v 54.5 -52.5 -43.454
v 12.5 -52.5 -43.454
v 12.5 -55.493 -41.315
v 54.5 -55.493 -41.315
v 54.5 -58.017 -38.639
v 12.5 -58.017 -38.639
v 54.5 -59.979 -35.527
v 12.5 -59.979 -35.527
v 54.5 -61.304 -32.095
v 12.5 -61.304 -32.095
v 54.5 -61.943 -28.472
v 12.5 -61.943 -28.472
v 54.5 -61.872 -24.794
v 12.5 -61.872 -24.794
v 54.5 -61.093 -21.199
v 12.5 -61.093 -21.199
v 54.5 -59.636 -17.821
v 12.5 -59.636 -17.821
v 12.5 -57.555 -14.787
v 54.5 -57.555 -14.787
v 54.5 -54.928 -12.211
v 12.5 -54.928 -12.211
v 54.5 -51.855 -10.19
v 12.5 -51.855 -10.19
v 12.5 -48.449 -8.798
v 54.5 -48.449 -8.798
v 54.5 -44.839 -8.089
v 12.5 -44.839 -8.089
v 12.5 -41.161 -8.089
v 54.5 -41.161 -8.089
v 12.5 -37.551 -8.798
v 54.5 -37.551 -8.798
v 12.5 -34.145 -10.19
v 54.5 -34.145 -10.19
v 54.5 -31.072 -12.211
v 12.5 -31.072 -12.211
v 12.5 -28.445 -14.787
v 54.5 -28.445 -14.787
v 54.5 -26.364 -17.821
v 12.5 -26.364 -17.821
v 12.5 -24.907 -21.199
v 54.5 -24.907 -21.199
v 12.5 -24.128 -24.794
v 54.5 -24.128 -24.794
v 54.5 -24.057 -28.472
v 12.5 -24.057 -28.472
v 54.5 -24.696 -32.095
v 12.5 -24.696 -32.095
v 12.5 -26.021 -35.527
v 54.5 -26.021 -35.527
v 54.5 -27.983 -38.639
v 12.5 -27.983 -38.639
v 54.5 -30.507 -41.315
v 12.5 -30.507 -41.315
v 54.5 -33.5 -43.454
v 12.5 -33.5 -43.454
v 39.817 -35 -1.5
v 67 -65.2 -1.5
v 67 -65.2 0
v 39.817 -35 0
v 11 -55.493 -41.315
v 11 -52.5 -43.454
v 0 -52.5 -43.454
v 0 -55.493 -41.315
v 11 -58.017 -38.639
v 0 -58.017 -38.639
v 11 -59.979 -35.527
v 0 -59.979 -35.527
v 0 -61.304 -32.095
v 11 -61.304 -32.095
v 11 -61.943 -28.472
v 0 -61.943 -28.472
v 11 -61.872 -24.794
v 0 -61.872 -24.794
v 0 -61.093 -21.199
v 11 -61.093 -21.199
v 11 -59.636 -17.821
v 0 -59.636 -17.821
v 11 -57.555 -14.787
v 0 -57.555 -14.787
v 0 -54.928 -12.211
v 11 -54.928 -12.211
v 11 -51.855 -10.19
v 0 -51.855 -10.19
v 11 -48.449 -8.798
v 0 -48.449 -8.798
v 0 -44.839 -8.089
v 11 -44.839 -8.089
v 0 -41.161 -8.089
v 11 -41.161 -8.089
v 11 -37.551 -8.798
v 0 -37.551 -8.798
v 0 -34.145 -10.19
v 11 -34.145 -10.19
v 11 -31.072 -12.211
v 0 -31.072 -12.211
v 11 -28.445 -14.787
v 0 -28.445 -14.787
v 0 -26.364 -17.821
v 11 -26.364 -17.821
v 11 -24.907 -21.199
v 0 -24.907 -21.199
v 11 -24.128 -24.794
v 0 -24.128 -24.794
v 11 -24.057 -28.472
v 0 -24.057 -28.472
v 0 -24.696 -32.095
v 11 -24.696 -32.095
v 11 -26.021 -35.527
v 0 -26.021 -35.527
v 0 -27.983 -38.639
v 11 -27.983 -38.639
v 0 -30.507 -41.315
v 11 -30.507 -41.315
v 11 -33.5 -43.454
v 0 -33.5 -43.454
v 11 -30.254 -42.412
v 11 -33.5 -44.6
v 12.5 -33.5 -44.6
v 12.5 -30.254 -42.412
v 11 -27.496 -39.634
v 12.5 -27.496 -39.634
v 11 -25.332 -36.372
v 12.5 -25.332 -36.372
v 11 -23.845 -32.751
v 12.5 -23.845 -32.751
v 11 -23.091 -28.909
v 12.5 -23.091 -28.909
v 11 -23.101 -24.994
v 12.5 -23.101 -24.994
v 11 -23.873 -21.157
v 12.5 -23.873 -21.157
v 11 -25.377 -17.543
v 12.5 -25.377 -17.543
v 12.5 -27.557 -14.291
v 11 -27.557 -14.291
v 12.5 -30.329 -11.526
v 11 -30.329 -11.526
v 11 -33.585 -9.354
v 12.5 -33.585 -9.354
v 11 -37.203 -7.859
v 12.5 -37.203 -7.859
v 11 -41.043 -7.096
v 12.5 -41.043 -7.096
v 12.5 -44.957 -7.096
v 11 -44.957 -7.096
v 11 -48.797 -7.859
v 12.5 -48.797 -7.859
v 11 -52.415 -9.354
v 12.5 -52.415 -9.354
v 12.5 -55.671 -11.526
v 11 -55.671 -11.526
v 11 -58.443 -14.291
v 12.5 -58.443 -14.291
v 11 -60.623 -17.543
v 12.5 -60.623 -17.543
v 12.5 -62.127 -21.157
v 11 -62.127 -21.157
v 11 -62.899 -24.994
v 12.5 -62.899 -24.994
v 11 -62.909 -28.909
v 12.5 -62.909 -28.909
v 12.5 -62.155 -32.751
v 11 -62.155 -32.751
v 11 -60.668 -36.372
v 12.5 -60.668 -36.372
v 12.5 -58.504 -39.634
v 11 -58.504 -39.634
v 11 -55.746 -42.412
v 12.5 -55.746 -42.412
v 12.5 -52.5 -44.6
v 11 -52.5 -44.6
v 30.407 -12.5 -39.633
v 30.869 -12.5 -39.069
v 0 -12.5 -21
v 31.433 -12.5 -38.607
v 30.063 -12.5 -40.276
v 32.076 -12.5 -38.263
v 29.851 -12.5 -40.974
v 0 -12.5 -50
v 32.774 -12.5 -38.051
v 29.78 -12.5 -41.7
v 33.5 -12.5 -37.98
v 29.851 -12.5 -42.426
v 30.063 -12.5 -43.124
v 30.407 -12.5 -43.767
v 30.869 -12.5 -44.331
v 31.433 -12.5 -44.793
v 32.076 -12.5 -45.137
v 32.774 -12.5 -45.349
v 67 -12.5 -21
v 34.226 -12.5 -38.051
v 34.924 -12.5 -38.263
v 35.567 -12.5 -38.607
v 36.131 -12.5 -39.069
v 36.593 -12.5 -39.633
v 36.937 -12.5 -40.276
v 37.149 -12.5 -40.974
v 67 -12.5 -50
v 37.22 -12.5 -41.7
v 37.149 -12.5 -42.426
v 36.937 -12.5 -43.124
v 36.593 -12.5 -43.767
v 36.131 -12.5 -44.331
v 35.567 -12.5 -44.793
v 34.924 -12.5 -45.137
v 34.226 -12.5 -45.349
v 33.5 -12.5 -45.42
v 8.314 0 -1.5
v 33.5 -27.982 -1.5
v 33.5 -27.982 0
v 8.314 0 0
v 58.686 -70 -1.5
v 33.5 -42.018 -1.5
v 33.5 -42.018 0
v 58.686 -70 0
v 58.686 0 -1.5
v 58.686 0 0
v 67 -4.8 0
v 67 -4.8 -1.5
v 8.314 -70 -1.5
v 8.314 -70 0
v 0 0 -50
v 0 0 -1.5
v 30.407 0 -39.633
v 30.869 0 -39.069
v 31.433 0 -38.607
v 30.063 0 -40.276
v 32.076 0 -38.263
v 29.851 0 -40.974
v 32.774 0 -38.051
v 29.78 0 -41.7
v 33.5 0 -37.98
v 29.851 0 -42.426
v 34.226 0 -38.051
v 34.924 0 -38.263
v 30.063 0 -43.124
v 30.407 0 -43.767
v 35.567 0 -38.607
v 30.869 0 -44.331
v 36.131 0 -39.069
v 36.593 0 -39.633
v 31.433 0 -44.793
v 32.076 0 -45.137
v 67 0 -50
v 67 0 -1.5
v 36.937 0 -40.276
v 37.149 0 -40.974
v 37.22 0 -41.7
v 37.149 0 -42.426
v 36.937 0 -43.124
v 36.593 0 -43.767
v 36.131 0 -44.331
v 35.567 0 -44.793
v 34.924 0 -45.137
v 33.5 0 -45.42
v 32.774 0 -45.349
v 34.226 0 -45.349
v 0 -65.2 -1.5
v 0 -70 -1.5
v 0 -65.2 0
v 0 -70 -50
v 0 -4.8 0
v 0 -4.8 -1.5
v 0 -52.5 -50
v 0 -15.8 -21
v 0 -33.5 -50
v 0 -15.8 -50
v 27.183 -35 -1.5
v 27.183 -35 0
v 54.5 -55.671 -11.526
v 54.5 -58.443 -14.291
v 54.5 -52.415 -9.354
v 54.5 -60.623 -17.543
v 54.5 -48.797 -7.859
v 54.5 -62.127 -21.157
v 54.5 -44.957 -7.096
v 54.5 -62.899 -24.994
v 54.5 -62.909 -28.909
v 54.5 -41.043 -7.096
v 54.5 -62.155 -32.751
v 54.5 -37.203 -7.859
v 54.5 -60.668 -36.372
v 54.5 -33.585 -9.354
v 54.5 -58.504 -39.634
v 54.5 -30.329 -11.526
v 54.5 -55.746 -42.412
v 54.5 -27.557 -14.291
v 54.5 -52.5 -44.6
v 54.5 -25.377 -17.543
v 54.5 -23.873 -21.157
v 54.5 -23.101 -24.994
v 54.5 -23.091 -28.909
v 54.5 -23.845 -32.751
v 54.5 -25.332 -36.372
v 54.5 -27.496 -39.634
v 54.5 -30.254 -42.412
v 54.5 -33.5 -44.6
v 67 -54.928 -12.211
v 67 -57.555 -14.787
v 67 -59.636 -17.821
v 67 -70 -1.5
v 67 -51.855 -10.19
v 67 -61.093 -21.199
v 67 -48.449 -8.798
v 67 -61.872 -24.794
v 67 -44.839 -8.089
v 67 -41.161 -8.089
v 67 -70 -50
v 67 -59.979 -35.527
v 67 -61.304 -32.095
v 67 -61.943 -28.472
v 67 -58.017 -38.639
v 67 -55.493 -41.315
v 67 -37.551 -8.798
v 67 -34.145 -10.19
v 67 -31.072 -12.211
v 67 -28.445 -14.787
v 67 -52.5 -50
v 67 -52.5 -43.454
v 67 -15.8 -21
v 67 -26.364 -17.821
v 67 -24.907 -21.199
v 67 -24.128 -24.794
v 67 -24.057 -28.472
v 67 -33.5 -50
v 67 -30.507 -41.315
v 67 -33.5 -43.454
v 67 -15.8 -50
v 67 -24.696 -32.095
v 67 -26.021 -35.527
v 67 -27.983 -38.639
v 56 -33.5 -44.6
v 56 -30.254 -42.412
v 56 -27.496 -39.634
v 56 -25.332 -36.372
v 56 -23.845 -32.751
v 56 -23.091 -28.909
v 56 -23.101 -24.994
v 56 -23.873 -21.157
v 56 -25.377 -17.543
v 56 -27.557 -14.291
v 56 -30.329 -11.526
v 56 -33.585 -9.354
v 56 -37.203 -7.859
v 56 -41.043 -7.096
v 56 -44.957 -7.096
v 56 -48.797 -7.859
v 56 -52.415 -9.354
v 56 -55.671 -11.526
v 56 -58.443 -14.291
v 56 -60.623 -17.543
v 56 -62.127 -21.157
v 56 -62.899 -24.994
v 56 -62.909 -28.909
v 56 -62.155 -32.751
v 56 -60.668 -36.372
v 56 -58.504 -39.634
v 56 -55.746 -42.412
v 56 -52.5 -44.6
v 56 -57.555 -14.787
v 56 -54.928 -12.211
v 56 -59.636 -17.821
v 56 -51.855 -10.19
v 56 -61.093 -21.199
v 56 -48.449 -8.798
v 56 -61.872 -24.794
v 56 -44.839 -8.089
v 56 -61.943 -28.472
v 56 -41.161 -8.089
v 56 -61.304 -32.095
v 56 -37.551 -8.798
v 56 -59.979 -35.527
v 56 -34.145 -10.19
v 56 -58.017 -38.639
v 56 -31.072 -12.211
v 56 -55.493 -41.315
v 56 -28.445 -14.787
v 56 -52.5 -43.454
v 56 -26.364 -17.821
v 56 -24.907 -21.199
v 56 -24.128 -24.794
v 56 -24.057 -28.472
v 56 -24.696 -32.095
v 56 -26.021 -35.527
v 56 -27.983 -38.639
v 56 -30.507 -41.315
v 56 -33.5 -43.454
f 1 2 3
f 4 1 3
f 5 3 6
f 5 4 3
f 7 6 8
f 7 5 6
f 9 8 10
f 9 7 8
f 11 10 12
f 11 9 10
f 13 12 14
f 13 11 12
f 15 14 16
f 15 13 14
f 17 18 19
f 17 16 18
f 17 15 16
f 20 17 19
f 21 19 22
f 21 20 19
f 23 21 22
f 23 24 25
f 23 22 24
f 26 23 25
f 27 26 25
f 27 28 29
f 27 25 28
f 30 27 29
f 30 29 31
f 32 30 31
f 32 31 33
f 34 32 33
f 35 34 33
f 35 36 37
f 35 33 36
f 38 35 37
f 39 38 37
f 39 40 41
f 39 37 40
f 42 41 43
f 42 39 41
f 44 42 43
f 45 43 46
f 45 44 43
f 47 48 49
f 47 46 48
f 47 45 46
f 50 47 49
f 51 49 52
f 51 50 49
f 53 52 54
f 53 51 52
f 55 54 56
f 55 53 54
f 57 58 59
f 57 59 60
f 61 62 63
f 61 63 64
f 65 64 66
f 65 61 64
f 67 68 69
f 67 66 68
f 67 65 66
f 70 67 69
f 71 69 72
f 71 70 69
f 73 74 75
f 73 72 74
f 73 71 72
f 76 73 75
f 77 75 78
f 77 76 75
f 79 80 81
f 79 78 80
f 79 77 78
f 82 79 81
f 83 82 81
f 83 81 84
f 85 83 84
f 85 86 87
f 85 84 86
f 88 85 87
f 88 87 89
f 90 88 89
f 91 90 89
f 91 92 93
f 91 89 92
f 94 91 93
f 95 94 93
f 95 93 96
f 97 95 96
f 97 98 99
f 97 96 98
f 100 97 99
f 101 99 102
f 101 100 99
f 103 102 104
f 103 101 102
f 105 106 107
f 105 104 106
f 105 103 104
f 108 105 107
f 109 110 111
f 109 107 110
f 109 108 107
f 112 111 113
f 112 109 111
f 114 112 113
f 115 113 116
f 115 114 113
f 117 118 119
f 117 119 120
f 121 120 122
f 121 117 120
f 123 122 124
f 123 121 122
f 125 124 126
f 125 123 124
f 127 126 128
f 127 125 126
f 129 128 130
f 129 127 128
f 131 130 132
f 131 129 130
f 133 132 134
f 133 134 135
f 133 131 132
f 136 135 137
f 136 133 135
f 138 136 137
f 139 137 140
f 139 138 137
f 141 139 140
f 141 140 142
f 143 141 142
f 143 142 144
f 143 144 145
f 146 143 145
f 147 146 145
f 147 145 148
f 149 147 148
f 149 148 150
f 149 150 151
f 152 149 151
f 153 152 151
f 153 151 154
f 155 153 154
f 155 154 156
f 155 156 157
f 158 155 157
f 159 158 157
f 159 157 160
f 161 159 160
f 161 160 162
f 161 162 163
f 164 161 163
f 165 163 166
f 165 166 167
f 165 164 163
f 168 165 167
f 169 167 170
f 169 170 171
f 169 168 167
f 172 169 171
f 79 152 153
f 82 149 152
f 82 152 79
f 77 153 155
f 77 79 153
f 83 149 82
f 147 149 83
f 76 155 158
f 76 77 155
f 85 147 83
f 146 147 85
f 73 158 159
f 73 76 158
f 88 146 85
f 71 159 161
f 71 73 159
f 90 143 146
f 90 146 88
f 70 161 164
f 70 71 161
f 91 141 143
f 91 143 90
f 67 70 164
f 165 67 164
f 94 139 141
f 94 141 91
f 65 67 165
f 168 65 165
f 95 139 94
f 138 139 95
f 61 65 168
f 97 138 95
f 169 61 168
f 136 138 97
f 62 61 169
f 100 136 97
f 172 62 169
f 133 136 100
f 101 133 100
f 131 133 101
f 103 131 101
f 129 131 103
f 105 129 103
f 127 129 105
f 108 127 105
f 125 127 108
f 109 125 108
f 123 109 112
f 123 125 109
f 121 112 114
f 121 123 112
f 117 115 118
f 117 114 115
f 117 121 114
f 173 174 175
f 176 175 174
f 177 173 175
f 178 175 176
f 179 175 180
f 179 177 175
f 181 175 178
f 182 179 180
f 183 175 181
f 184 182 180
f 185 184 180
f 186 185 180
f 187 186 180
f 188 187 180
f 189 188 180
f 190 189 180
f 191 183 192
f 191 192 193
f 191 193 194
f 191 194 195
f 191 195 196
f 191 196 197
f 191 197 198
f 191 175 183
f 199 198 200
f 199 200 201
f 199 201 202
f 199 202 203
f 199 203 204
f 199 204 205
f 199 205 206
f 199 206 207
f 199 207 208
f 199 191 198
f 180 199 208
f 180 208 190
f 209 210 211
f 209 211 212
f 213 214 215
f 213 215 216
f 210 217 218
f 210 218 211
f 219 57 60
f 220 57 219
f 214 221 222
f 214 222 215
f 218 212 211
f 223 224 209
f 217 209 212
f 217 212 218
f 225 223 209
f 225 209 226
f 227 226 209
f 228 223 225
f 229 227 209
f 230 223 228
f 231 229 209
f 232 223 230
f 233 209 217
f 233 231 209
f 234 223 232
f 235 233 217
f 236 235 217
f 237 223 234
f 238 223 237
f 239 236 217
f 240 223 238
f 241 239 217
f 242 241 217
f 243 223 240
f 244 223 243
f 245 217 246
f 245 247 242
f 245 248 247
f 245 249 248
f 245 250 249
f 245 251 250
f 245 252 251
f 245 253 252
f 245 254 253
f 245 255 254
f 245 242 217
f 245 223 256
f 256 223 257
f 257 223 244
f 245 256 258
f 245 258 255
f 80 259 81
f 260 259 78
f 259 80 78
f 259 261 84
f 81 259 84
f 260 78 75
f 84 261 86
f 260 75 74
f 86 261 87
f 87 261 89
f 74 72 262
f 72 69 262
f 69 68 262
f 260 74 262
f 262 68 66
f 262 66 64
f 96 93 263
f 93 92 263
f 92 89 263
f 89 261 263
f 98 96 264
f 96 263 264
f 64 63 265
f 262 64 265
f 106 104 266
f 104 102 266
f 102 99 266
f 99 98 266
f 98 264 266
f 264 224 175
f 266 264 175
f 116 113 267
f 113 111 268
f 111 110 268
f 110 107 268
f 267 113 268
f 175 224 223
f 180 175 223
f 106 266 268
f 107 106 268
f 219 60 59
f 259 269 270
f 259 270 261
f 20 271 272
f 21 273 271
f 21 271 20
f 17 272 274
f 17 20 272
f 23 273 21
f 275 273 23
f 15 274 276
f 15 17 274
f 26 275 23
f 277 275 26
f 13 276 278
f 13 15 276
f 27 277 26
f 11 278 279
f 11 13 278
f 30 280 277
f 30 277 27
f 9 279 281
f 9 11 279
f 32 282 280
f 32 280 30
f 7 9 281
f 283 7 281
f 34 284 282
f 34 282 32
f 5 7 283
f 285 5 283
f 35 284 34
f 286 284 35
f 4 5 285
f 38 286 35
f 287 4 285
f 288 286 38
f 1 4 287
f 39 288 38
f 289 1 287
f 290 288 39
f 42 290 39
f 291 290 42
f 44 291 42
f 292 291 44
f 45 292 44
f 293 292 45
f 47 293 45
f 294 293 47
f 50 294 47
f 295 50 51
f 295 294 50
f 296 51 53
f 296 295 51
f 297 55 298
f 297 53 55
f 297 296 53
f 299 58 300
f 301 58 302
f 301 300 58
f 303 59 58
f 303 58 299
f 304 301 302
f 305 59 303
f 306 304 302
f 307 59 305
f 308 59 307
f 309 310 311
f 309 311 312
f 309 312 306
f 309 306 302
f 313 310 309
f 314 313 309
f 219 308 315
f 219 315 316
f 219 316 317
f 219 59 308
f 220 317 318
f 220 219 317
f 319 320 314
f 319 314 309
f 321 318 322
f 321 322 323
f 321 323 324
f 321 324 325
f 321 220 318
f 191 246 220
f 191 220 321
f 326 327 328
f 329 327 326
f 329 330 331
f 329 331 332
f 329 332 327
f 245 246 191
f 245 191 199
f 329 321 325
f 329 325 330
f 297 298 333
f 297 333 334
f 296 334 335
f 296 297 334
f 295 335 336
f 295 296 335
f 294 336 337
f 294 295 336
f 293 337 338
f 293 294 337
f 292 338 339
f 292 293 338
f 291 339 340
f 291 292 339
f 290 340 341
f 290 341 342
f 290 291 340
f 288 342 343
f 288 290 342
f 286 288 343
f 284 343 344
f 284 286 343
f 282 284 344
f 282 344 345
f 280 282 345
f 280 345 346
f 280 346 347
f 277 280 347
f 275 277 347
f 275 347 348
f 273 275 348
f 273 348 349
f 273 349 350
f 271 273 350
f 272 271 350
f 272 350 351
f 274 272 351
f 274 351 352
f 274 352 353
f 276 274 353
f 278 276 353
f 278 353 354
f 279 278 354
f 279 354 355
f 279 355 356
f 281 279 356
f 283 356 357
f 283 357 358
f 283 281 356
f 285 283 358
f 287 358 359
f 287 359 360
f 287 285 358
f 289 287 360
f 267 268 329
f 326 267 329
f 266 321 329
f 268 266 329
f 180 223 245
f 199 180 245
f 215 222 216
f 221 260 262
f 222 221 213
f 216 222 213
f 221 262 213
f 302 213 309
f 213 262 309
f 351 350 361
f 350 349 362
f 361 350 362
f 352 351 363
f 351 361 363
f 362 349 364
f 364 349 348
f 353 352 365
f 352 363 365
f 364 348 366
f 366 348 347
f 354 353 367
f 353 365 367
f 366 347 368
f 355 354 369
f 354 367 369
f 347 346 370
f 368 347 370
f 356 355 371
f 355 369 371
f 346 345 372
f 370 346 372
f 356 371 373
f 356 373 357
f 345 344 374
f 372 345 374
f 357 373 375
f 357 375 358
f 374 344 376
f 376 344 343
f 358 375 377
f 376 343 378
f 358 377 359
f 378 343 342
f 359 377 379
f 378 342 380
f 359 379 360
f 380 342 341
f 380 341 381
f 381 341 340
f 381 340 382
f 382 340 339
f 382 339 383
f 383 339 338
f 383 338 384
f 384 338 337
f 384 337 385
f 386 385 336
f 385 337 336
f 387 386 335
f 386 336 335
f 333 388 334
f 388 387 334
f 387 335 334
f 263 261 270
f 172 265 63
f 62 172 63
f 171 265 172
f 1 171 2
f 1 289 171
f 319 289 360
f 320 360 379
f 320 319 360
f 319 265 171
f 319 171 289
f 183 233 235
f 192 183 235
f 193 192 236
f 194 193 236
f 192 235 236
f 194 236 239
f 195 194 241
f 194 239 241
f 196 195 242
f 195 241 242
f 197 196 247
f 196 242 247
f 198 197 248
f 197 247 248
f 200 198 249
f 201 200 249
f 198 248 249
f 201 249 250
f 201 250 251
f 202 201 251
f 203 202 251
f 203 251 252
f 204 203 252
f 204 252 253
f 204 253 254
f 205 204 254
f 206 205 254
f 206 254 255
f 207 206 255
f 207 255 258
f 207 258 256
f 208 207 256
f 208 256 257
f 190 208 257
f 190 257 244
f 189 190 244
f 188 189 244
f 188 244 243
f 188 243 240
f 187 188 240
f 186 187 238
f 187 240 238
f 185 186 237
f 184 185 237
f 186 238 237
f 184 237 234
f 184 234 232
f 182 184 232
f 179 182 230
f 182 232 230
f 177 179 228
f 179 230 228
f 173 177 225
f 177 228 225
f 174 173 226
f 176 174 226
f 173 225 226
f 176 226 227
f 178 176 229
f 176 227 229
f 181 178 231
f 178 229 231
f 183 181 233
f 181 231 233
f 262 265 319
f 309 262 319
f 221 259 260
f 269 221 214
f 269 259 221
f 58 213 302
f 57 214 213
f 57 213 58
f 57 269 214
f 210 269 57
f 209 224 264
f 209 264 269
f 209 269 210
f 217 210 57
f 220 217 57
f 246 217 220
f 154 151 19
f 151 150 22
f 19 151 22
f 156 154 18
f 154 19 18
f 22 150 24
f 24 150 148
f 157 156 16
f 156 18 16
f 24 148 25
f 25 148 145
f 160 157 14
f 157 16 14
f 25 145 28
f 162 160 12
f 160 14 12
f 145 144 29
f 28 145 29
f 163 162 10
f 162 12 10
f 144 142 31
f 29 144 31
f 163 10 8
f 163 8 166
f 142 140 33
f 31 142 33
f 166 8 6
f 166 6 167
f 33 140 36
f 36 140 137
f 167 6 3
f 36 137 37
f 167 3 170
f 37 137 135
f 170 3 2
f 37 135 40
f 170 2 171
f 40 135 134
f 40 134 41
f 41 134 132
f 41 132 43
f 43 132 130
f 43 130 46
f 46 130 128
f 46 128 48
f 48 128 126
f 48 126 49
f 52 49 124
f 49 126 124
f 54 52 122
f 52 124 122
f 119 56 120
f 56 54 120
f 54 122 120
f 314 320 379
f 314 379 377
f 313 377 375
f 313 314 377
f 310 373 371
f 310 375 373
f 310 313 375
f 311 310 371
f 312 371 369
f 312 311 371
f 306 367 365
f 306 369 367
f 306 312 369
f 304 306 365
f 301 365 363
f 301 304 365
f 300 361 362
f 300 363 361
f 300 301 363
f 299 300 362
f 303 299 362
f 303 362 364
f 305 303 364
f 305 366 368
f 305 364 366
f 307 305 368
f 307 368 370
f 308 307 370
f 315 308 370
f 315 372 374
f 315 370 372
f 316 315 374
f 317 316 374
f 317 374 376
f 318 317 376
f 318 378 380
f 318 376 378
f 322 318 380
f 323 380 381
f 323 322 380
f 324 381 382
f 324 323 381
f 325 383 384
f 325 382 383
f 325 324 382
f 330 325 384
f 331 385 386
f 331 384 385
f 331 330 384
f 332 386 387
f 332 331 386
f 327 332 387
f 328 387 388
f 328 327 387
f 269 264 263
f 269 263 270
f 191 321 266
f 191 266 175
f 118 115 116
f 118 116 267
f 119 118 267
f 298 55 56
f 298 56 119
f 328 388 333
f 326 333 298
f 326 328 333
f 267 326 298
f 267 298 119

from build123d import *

# Parameters (mm, degrees)
SKETCH3_W               = 67
SKETCH3_H               = 50
BOSS_EXTRUDE1_DEPTH     = 70
CUT_EXTRUDE1_DEPTH      = 110.036691072
CUT_EXTRUDE1_DEPTH_BACK = 1.5
CUT_EXTRUDE3_DEPTH      = 110.036691072
SKETCH8_W               = 29
SKETCH8_H               = 3.3
CUT_EXTRUDE4_DEPTH      = 110.036691072
CUT_EXTRUDE5_REACH      = 111.037
SKETCH4_R               = 3.720223744
SKETCH9_R               = 20
CUT_EXTRUDE6_DEPTH      = 1.5
CUT_EXTRUDE7_START      = -1.5
SKETCH10_R              = 20
CUT_EXTRUDE7_DEPTH      = 1.5


with BuildPart() as part:
    # Sketch3 → Boss-Extrude1 (new body)
    with BuildSketch(Plane(origin=(0, 0, 0), x_dir=(1, 0, 0), z_dir=(0, 1, 0))):
        with Locations((33.5, 25)):
            Rectangle(SKETCH3_W, SKETCH3_H)
    extrude(amount=-BOSS_EXTRUDE1_DEPTH)

    # Sketch5 → Cut-Extrude1 (cut, two sides: drawn at the far end of the back side and taken through both)
    with BuildSketch(Plane.XY.offset(-CUT_EXTRUDE1_DEPTH_BACK)):
        Polygon((27.182851456, -35), (0, -65.2), (0, -70), (8.313843876, -70), (33.5, -42.018317645), (58.686156124, -70), (67, -70), (67, -65.2), (39.817148544, -35), (67, -4.8), (67, 0), (58.686156124, 0), (33.5, -27.981682355), (8.313843876, 0), (0, 0), (0, -4.8), align=None)
    extrude(amount=CUT_EXTRUDE1_DEPTH + CUT_EXTRUDE1_DEPTH_BACK, mode=Mode.SUBTRACT)

    # Sketch6 → Cut-Extrude3 (cut, through all)
    with BuildSketch(Plane(origin=(67, 0, 0), x_dir=(0, 0, -1), z_dir=(1, 0, 0))):
        with BuildLine():
            Line((43.454482672, -33.5), (50, -33.5))
            Line((50, -33.5), (50, -52.5))
            Line((50, -52.5), (43.454482672, -52.5))
            ThreePointArc((43.454482672, -52.5), (8, -43), (43.454482672, -33.5))
        make_face()
    extrude(amount=-CUT_EXTRUDE3_DEPTH, mode=Mode.SUBTRACT)

    # Sketch8 → Cut-Extrude4 (cut, through all)
    with BuildSketch(Plane(origin=(67, 0, 0), x_dir=(0, 0, -1), z_dir=(1, 0, 0))):
        with Locations((35.5, -14.15)):
            Rectangle(SKETCH8_W, SKETCH8_H)
    extrude(amount=-CUT_EXTRUDE4_DEPTH, mode=Mode.SUBTRACT)

    # Sketch4 → Cut-Extrude5 (cut, up to next)
    with BuildSketch(Plane(origin=(0, 0, 0), x_dir=(1, 0, 0), z_dir=(0, 1, 0)), mode=Mode.PRIVATE) as cut_extrude5_sk1:
        with Locations(Location((33.5, 41.7, 0), (0, 0, 270))):
            Circle(SKETCH4_R)
    cut_extrude5_tool1 = extrude(cut_extrude5_sk1.sketch, amount=-CUT_EXTRUDE5_REACH, mode=Mode.PRIVATE) & part.part
    add(cut_extrude5_tool1.solids().sort_by_distance((33.5, 0, -41.7))[0], mode=Mode.SUBTRACT)

    # Sketch9 → Cut-Extrude6 (cut)
    with BuildSketch(Plane(origin=(54.5, 0, 0), x_dir=(0, 0, -1), z_dir=(1, 0, 0))):
        with Locations((27, -43)):
            Circle(SKETCH9_R)
    extrude(amount=CUT_EXTRUDE6_DEPTH, mode=Mode.SUBTRACT)

    # Sketch10 → Cut-Extrude7 (cut)
    with BuildSketch(Plane(origin=(12.5, 0, 0), x_dir=(0, 0, -1), z_dir=(1, 0, 0)).offset(CUT_EXTRUDE7_START)):
        with Locations((27, -43)):
            Circle(SKETCH10_R)
    extrude(amount=CUT_EXTRUDE7_DEPTH, mode=Mode.SUBTRACT)


solid = part.part
